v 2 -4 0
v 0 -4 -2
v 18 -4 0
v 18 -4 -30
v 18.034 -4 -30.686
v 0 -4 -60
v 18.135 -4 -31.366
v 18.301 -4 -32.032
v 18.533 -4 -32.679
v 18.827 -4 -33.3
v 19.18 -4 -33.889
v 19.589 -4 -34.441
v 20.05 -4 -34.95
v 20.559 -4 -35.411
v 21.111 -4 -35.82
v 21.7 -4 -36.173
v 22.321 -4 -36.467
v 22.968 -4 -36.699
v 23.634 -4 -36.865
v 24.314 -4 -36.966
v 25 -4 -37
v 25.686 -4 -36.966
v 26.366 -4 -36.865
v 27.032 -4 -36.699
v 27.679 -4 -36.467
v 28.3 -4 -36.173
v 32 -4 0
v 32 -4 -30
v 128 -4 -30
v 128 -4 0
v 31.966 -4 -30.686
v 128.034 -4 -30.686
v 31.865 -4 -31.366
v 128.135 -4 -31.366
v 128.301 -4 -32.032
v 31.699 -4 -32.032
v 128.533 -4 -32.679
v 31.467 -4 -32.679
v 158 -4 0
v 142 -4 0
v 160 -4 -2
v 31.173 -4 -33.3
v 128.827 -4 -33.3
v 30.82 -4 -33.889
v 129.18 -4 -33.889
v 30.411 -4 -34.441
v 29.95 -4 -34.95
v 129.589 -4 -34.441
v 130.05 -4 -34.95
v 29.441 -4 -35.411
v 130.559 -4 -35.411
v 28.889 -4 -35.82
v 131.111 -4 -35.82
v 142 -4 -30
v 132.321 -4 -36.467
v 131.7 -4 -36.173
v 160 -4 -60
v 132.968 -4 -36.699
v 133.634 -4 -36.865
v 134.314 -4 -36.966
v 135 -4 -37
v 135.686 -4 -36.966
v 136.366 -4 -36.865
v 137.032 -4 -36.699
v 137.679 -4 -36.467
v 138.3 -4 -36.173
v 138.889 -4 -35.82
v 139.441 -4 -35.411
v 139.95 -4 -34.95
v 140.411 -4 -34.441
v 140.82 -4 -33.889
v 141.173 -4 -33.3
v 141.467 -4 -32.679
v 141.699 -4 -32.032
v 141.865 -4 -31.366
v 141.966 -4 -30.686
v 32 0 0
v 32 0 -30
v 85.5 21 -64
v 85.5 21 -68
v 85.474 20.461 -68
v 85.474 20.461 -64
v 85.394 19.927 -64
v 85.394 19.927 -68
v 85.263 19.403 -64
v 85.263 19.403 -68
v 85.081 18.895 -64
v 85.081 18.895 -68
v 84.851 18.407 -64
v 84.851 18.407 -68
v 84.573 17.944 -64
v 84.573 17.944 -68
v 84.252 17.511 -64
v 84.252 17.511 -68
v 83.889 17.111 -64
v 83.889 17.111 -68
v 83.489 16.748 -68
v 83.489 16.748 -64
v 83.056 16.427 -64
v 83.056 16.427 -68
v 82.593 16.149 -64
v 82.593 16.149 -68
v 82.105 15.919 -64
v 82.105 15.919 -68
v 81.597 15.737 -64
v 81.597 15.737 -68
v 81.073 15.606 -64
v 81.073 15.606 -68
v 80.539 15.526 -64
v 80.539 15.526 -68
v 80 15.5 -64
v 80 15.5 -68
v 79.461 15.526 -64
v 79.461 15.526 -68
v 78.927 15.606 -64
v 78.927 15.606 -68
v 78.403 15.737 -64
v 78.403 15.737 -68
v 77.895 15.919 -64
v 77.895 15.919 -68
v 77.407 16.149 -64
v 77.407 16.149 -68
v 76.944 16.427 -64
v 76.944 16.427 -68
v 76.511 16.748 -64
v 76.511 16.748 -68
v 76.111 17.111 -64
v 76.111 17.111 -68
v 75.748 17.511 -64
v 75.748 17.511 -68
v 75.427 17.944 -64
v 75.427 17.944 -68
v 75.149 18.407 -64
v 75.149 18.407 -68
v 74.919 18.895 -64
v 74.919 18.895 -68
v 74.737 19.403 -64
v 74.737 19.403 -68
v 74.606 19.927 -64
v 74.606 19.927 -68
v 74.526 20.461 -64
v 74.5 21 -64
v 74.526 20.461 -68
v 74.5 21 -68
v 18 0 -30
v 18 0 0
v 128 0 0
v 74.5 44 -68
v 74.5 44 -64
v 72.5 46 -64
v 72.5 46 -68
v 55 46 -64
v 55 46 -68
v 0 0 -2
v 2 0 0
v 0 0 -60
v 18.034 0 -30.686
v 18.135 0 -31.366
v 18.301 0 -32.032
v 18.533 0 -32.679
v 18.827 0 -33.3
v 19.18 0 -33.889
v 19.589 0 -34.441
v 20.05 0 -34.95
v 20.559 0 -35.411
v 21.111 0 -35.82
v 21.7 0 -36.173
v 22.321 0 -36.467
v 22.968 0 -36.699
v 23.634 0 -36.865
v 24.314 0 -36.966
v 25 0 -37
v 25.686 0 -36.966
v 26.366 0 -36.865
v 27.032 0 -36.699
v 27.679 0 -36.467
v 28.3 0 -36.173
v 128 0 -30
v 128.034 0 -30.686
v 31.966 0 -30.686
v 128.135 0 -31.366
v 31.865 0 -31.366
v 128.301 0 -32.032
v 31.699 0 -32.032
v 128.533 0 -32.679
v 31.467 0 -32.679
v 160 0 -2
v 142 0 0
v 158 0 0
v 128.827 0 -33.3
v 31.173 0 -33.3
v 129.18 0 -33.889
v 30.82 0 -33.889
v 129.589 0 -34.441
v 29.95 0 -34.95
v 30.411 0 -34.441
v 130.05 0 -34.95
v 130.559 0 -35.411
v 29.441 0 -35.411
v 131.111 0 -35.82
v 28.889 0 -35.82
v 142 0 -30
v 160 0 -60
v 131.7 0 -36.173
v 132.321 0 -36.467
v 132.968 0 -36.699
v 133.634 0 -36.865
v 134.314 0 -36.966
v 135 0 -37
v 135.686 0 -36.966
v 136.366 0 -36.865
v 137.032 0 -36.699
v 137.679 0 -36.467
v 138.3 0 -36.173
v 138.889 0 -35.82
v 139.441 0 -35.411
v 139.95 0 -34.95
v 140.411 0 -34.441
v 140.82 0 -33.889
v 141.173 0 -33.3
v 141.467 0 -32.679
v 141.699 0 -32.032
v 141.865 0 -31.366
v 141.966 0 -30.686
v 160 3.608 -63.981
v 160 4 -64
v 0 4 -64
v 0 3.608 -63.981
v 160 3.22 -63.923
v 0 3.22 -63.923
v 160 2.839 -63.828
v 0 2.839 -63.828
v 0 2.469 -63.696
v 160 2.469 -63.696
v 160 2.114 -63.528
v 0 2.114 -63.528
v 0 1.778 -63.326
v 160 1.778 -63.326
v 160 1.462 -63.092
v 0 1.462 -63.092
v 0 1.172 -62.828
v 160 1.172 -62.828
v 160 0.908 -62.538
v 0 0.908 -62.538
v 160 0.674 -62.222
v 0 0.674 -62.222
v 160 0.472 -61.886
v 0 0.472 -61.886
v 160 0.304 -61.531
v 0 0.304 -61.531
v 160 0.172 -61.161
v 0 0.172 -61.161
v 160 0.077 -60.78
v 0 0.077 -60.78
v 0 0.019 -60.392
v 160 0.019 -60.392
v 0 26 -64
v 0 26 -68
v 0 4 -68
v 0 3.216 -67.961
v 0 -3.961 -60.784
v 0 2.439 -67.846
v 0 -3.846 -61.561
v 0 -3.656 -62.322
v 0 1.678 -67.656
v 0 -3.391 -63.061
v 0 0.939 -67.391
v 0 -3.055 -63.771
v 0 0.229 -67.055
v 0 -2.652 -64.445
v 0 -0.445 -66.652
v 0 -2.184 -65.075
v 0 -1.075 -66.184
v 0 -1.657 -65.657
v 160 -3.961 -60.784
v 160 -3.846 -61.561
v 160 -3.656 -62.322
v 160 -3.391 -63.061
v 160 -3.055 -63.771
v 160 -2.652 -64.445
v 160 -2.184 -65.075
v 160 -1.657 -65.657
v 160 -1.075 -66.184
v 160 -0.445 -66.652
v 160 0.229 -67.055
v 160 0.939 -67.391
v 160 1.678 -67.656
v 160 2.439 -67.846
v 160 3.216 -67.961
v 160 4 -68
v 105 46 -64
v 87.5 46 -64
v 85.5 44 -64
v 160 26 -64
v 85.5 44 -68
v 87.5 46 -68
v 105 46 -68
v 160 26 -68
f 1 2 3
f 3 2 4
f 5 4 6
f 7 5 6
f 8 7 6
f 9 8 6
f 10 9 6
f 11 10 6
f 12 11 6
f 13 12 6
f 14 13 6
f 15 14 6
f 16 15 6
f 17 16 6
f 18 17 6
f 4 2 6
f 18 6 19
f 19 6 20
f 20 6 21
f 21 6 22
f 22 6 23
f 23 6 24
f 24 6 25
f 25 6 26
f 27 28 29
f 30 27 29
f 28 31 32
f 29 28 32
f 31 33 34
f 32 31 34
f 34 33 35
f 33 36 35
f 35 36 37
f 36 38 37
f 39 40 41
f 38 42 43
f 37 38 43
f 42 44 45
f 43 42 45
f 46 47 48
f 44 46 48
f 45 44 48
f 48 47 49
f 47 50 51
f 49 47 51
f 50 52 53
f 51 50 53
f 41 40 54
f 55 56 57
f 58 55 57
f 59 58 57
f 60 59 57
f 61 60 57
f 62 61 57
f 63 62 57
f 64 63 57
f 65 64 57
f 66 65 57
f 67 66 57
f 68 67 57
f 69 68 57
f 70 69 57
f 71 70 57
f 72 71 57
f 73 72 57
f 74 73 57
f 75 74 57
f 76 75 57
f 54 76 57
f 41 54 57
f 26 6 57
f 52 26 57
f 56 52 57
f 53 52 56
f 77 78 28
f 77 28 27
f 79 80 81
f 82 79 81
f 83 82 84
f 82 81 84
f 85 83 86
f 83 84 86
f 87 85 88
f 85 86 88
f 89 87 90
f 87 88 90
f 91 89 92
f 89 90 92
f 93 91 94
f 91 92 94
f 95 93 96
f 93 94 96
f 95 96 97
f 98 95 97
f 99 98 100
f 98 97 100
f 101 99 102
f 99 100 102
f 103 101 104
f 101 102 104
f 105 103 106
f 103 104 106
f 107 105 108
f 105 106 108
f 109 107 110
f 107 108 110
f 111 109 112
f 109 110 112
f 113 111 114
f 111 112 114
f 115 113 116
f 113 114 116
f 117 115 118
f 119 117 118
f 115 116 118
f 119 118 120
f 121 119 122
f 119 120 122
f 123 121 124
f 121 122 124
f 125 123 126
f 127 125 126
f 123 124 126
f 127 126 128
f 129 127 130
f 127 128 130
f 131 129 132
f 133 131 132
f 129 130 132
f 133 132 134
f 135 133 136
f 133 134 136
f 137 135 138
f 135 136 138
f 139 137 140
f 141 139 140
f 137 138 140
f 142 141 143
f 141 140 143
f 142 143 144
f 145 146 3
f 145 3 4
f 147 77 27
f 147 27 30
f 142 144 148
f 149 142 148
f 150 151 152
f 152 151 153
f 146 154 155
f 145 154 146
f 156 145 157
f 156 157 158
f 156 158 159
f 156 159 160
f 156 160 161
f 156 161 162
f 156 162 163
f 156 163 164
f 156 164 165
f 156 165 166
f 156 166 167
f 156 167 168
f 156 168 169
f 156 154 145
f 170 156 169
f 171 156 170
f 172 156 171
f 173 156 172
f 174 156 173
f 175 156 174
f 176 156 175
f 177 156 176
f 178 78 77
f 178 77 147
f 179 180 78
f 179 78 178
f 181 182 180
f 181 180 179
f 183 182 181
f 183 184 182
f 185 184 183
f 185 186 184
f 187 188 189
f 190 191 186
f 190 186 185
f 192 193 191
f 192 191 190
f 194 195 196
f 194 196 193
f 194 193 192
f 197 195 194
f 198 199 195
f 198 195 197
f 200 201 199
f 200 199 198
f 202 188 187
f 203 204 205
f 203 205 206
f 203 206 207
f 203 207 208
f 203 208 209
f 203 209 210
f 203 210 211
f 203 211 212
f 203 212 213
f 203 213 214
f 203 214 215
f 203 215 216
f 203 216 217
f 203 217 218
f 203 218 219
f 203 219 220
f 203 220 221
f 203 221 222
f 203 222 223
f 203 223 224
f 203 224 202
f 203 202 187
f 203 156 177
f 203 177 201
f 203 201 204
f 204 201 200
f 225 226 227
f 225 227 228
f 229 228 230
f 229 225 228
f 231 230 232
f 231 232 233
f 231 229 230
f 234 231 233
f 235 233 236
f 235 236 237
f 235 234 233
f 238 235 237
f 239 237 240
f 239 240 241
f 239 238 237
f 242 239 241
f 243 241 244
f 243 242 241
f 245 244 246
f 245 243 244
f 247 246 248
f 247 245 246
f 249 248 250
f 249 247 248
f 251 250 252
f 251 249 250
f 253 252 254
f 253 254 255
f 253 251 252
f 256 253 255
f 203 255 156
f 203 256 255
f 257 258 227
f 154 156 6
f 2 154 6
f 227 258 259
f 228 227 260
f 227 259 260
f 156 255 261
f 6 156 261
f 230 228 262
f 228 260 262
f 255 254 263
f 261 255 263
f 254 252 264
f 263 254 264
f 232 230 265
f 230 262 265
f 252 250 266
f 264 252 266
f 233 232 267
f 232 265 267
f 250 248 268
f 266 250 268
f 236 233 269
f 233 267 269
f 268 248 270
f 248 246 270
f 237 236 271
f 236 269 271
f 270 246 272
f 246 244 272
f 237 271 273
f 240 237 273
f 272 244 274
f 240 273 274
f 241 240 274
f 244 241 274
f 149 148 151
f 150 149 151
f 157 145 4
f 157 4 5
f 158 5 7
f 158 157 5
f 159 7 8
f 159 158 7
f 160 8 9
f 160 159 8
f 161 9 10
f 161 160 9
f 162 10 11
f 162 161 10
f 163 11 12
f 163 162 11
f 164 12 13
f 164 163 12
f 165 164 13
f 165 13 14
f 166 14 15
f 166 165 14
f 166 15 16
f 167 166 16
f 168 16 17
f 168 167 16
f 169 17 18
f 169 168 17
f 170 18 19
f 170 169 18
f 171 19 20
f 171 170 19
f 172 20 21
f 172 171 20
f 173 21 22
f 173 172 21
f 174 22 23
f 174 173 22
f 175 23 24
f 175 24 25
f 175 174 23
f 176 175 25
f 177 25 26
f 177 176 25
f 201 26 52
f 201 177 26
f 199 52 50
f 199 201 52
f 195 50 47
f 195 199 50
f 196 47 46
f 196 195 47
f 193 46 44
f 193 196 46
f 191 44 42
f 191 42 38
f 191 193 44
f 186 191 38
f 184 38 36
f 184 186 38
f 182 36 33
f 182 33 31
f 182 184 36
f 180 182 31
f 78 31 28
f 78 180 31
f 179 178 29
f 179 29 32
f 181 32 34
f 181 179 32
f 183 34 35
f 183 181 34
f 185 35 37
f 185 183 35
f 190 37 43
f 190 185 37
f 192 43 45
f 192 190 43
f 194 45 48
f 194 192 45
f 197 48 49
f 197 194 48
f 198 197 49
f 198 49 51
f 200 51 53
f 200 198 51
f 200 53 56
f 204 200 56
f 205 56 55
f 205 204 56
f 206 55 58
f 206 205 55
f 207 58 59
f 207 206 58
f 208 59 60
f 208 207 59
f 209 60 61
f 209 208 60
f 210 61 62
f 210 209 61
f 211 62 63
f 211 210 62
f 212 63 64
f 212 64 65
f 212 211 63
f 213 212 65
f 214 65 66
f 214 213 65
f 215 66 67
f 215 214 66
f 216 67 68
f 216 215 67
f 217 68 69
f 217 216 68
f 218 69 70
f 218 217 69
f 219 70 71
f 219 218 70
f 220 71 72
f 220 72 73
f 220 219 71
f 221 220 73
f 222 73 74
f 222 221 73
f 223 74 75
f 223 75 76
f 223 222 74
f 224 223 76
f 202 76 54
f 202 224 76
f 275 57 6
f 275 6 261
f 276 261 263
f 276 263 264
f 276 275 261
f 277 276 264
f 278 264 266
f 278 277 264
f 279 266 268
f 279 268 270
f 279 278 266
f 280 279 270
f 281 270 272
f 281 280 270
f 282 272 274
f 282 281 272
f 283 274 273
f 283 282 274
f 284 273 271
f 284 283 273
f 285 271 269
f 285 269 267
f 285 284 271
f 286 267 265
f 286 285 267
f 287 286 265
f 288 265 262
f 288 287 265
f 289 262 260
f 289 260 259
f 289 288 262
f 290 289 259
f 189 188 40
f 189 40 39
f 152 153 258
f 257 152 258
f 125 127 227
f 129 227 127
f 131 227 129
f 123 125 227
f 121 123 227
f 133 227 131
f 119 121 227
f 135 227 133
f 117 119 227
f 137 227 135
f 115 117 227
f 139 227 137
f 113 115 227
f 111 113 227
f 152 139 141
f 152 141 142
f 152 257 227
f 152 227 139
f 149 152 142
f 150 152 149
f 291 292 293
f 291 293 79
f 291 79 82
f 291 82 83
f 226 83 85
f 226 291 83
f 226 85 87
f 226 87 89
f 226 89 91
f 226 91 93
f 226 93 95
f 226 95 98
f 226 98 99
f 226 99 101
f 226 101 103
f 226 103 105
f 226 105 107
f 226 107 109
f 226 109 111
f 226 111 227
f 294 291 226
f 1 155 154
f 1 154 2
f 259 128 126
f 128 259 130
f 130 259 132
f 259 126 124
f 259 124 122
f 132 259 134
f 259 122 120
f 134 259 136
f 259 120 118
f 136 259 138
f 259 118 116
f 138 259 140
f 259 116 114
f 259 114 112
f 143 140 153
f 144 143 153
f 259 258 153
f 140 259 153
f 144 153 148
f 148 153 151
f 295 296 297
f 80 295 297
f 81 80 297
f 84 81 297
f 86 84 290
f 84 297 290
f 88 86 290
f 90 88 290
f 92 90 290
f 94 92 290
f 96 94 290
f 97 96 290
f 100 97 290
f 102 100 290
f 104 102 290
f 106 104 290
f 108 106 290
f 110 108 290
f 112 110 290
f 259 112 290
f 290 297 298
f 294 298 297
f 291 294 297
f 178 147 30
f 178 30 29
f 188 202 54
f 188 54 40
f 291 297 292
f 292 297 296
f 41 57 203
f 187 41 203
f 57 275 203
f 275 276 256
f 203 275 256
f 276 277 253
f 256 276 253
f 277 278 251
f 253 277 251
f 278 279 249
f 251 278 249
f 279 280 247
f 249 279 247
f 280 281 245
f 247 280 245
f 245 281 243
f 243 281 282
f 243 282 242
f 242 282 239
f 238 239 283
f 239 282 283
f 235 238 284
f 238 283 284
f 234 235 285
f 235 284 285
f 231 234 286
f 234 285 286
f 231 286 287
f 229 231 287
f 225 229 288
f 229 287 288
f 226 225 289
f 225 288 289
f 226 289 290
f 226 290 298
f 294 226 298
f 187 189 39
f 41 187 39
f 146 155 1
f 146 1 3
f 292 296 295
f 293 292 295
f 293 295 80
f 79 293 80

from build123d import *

# Parameters (mm, degrees)
BASE_FLANGE1_DEPTH      = 4
EDGE_FLANGE1_DEPTH      = 160
EDGE_FLANGE1_START      = -4
EDGE_FLANGE1_FLAT_DEPTH = 4
CHAMFER1_SIZE           = 2


# Sheet-metal steps are written as plain solids
with BuildPart() as part:
    # Sketch1 → Base-Flange1 (new body)
    with BuildSketch(Plane(origin=(0, 0, 0), x_dir=(1, 0, 0), z_dir=(0, 1, 0))):
        with BuildLine():
            Line((0, 0), (18, 0))
            Line((18, 0), (18, 30))
            ThreePointArc((18, 30), (25, 37), (32, 30))
            Line((32, 30), (32, 0))
            Line((32, 0), (128, 0))
            Line((128, 0), (128, 30))
            ThreePointArc((128, 30), (135, 37), (142, 30))
            Line((142, 30), (142, 0))
            Line((142, 0), (160, 0))
            Line((160, 0), (160, 60))
            Line((160, 60), (0, 60))
            Line((0, 60), (0, 0))
        make_face()
    extrude(amount=-BASE_FLANGE1_DEPTH)

    # Edge-Flange1 bend section (across the edge) → Edge-Flange1 (add)
    with BuildSketch(Plane(origin=(160, 0, -64), x_dir=(0, 0, 1), z_dir=(-1, 0, 0))):
        with BuildLine():
            Line((-4, 4), (0, 4))
            ThreePointArc((0, 4), (1.171572875, 1.171572875), (4, 0))
            Line((4, 0), (4, -4))
            ThreePointArc((4, -4), (-1.656854249, -1.656854249), (-4, 4))
        make_face()
    extrude(amount=EDGE_FLANGE1_DEPTH)

    # Edge-Flange1 profile (on flange) → Edge-Flange1 flat (add)
    with BuildSketch(Plane.XY.offset(-64).offset(EDGE_FLANGE1_START)):
        with BuildLine():
            Line((0, 4), (160, 4))
            Line((160, 4), (160, 26))
            Line((160, 26), (105, 46))
            Line((105, 46), (87.5, 46))
            Line((87.5, 46), (85.5, 44))
            Line((85.5, 44), (85.5, 21))
            ThreePointArc((85.5, 21), (80, 15.5), (74.5, 21))
            Line((74.5, 21), (74.5, 44))
            Line((74.5, 44), (72.5, 46))
            Line((72.5, 46), (55, 46))
            Line((55, 46), (0, 26))
            Line((0, 26), (0, 4))
        make_face()
    extrude(amount=EDGE_FLANGE1_FLAT_DEPTH)

    # Chamfer1
    chamfer1_edges = [part.edges().sort_by_distance(p)[0] for p in [
        (160, -2, 0),
        (0, -2, 0),
    ]]
    chamfer(chamfer1_edges, length=CHAMFER1_SIZE)


solid = part.part
